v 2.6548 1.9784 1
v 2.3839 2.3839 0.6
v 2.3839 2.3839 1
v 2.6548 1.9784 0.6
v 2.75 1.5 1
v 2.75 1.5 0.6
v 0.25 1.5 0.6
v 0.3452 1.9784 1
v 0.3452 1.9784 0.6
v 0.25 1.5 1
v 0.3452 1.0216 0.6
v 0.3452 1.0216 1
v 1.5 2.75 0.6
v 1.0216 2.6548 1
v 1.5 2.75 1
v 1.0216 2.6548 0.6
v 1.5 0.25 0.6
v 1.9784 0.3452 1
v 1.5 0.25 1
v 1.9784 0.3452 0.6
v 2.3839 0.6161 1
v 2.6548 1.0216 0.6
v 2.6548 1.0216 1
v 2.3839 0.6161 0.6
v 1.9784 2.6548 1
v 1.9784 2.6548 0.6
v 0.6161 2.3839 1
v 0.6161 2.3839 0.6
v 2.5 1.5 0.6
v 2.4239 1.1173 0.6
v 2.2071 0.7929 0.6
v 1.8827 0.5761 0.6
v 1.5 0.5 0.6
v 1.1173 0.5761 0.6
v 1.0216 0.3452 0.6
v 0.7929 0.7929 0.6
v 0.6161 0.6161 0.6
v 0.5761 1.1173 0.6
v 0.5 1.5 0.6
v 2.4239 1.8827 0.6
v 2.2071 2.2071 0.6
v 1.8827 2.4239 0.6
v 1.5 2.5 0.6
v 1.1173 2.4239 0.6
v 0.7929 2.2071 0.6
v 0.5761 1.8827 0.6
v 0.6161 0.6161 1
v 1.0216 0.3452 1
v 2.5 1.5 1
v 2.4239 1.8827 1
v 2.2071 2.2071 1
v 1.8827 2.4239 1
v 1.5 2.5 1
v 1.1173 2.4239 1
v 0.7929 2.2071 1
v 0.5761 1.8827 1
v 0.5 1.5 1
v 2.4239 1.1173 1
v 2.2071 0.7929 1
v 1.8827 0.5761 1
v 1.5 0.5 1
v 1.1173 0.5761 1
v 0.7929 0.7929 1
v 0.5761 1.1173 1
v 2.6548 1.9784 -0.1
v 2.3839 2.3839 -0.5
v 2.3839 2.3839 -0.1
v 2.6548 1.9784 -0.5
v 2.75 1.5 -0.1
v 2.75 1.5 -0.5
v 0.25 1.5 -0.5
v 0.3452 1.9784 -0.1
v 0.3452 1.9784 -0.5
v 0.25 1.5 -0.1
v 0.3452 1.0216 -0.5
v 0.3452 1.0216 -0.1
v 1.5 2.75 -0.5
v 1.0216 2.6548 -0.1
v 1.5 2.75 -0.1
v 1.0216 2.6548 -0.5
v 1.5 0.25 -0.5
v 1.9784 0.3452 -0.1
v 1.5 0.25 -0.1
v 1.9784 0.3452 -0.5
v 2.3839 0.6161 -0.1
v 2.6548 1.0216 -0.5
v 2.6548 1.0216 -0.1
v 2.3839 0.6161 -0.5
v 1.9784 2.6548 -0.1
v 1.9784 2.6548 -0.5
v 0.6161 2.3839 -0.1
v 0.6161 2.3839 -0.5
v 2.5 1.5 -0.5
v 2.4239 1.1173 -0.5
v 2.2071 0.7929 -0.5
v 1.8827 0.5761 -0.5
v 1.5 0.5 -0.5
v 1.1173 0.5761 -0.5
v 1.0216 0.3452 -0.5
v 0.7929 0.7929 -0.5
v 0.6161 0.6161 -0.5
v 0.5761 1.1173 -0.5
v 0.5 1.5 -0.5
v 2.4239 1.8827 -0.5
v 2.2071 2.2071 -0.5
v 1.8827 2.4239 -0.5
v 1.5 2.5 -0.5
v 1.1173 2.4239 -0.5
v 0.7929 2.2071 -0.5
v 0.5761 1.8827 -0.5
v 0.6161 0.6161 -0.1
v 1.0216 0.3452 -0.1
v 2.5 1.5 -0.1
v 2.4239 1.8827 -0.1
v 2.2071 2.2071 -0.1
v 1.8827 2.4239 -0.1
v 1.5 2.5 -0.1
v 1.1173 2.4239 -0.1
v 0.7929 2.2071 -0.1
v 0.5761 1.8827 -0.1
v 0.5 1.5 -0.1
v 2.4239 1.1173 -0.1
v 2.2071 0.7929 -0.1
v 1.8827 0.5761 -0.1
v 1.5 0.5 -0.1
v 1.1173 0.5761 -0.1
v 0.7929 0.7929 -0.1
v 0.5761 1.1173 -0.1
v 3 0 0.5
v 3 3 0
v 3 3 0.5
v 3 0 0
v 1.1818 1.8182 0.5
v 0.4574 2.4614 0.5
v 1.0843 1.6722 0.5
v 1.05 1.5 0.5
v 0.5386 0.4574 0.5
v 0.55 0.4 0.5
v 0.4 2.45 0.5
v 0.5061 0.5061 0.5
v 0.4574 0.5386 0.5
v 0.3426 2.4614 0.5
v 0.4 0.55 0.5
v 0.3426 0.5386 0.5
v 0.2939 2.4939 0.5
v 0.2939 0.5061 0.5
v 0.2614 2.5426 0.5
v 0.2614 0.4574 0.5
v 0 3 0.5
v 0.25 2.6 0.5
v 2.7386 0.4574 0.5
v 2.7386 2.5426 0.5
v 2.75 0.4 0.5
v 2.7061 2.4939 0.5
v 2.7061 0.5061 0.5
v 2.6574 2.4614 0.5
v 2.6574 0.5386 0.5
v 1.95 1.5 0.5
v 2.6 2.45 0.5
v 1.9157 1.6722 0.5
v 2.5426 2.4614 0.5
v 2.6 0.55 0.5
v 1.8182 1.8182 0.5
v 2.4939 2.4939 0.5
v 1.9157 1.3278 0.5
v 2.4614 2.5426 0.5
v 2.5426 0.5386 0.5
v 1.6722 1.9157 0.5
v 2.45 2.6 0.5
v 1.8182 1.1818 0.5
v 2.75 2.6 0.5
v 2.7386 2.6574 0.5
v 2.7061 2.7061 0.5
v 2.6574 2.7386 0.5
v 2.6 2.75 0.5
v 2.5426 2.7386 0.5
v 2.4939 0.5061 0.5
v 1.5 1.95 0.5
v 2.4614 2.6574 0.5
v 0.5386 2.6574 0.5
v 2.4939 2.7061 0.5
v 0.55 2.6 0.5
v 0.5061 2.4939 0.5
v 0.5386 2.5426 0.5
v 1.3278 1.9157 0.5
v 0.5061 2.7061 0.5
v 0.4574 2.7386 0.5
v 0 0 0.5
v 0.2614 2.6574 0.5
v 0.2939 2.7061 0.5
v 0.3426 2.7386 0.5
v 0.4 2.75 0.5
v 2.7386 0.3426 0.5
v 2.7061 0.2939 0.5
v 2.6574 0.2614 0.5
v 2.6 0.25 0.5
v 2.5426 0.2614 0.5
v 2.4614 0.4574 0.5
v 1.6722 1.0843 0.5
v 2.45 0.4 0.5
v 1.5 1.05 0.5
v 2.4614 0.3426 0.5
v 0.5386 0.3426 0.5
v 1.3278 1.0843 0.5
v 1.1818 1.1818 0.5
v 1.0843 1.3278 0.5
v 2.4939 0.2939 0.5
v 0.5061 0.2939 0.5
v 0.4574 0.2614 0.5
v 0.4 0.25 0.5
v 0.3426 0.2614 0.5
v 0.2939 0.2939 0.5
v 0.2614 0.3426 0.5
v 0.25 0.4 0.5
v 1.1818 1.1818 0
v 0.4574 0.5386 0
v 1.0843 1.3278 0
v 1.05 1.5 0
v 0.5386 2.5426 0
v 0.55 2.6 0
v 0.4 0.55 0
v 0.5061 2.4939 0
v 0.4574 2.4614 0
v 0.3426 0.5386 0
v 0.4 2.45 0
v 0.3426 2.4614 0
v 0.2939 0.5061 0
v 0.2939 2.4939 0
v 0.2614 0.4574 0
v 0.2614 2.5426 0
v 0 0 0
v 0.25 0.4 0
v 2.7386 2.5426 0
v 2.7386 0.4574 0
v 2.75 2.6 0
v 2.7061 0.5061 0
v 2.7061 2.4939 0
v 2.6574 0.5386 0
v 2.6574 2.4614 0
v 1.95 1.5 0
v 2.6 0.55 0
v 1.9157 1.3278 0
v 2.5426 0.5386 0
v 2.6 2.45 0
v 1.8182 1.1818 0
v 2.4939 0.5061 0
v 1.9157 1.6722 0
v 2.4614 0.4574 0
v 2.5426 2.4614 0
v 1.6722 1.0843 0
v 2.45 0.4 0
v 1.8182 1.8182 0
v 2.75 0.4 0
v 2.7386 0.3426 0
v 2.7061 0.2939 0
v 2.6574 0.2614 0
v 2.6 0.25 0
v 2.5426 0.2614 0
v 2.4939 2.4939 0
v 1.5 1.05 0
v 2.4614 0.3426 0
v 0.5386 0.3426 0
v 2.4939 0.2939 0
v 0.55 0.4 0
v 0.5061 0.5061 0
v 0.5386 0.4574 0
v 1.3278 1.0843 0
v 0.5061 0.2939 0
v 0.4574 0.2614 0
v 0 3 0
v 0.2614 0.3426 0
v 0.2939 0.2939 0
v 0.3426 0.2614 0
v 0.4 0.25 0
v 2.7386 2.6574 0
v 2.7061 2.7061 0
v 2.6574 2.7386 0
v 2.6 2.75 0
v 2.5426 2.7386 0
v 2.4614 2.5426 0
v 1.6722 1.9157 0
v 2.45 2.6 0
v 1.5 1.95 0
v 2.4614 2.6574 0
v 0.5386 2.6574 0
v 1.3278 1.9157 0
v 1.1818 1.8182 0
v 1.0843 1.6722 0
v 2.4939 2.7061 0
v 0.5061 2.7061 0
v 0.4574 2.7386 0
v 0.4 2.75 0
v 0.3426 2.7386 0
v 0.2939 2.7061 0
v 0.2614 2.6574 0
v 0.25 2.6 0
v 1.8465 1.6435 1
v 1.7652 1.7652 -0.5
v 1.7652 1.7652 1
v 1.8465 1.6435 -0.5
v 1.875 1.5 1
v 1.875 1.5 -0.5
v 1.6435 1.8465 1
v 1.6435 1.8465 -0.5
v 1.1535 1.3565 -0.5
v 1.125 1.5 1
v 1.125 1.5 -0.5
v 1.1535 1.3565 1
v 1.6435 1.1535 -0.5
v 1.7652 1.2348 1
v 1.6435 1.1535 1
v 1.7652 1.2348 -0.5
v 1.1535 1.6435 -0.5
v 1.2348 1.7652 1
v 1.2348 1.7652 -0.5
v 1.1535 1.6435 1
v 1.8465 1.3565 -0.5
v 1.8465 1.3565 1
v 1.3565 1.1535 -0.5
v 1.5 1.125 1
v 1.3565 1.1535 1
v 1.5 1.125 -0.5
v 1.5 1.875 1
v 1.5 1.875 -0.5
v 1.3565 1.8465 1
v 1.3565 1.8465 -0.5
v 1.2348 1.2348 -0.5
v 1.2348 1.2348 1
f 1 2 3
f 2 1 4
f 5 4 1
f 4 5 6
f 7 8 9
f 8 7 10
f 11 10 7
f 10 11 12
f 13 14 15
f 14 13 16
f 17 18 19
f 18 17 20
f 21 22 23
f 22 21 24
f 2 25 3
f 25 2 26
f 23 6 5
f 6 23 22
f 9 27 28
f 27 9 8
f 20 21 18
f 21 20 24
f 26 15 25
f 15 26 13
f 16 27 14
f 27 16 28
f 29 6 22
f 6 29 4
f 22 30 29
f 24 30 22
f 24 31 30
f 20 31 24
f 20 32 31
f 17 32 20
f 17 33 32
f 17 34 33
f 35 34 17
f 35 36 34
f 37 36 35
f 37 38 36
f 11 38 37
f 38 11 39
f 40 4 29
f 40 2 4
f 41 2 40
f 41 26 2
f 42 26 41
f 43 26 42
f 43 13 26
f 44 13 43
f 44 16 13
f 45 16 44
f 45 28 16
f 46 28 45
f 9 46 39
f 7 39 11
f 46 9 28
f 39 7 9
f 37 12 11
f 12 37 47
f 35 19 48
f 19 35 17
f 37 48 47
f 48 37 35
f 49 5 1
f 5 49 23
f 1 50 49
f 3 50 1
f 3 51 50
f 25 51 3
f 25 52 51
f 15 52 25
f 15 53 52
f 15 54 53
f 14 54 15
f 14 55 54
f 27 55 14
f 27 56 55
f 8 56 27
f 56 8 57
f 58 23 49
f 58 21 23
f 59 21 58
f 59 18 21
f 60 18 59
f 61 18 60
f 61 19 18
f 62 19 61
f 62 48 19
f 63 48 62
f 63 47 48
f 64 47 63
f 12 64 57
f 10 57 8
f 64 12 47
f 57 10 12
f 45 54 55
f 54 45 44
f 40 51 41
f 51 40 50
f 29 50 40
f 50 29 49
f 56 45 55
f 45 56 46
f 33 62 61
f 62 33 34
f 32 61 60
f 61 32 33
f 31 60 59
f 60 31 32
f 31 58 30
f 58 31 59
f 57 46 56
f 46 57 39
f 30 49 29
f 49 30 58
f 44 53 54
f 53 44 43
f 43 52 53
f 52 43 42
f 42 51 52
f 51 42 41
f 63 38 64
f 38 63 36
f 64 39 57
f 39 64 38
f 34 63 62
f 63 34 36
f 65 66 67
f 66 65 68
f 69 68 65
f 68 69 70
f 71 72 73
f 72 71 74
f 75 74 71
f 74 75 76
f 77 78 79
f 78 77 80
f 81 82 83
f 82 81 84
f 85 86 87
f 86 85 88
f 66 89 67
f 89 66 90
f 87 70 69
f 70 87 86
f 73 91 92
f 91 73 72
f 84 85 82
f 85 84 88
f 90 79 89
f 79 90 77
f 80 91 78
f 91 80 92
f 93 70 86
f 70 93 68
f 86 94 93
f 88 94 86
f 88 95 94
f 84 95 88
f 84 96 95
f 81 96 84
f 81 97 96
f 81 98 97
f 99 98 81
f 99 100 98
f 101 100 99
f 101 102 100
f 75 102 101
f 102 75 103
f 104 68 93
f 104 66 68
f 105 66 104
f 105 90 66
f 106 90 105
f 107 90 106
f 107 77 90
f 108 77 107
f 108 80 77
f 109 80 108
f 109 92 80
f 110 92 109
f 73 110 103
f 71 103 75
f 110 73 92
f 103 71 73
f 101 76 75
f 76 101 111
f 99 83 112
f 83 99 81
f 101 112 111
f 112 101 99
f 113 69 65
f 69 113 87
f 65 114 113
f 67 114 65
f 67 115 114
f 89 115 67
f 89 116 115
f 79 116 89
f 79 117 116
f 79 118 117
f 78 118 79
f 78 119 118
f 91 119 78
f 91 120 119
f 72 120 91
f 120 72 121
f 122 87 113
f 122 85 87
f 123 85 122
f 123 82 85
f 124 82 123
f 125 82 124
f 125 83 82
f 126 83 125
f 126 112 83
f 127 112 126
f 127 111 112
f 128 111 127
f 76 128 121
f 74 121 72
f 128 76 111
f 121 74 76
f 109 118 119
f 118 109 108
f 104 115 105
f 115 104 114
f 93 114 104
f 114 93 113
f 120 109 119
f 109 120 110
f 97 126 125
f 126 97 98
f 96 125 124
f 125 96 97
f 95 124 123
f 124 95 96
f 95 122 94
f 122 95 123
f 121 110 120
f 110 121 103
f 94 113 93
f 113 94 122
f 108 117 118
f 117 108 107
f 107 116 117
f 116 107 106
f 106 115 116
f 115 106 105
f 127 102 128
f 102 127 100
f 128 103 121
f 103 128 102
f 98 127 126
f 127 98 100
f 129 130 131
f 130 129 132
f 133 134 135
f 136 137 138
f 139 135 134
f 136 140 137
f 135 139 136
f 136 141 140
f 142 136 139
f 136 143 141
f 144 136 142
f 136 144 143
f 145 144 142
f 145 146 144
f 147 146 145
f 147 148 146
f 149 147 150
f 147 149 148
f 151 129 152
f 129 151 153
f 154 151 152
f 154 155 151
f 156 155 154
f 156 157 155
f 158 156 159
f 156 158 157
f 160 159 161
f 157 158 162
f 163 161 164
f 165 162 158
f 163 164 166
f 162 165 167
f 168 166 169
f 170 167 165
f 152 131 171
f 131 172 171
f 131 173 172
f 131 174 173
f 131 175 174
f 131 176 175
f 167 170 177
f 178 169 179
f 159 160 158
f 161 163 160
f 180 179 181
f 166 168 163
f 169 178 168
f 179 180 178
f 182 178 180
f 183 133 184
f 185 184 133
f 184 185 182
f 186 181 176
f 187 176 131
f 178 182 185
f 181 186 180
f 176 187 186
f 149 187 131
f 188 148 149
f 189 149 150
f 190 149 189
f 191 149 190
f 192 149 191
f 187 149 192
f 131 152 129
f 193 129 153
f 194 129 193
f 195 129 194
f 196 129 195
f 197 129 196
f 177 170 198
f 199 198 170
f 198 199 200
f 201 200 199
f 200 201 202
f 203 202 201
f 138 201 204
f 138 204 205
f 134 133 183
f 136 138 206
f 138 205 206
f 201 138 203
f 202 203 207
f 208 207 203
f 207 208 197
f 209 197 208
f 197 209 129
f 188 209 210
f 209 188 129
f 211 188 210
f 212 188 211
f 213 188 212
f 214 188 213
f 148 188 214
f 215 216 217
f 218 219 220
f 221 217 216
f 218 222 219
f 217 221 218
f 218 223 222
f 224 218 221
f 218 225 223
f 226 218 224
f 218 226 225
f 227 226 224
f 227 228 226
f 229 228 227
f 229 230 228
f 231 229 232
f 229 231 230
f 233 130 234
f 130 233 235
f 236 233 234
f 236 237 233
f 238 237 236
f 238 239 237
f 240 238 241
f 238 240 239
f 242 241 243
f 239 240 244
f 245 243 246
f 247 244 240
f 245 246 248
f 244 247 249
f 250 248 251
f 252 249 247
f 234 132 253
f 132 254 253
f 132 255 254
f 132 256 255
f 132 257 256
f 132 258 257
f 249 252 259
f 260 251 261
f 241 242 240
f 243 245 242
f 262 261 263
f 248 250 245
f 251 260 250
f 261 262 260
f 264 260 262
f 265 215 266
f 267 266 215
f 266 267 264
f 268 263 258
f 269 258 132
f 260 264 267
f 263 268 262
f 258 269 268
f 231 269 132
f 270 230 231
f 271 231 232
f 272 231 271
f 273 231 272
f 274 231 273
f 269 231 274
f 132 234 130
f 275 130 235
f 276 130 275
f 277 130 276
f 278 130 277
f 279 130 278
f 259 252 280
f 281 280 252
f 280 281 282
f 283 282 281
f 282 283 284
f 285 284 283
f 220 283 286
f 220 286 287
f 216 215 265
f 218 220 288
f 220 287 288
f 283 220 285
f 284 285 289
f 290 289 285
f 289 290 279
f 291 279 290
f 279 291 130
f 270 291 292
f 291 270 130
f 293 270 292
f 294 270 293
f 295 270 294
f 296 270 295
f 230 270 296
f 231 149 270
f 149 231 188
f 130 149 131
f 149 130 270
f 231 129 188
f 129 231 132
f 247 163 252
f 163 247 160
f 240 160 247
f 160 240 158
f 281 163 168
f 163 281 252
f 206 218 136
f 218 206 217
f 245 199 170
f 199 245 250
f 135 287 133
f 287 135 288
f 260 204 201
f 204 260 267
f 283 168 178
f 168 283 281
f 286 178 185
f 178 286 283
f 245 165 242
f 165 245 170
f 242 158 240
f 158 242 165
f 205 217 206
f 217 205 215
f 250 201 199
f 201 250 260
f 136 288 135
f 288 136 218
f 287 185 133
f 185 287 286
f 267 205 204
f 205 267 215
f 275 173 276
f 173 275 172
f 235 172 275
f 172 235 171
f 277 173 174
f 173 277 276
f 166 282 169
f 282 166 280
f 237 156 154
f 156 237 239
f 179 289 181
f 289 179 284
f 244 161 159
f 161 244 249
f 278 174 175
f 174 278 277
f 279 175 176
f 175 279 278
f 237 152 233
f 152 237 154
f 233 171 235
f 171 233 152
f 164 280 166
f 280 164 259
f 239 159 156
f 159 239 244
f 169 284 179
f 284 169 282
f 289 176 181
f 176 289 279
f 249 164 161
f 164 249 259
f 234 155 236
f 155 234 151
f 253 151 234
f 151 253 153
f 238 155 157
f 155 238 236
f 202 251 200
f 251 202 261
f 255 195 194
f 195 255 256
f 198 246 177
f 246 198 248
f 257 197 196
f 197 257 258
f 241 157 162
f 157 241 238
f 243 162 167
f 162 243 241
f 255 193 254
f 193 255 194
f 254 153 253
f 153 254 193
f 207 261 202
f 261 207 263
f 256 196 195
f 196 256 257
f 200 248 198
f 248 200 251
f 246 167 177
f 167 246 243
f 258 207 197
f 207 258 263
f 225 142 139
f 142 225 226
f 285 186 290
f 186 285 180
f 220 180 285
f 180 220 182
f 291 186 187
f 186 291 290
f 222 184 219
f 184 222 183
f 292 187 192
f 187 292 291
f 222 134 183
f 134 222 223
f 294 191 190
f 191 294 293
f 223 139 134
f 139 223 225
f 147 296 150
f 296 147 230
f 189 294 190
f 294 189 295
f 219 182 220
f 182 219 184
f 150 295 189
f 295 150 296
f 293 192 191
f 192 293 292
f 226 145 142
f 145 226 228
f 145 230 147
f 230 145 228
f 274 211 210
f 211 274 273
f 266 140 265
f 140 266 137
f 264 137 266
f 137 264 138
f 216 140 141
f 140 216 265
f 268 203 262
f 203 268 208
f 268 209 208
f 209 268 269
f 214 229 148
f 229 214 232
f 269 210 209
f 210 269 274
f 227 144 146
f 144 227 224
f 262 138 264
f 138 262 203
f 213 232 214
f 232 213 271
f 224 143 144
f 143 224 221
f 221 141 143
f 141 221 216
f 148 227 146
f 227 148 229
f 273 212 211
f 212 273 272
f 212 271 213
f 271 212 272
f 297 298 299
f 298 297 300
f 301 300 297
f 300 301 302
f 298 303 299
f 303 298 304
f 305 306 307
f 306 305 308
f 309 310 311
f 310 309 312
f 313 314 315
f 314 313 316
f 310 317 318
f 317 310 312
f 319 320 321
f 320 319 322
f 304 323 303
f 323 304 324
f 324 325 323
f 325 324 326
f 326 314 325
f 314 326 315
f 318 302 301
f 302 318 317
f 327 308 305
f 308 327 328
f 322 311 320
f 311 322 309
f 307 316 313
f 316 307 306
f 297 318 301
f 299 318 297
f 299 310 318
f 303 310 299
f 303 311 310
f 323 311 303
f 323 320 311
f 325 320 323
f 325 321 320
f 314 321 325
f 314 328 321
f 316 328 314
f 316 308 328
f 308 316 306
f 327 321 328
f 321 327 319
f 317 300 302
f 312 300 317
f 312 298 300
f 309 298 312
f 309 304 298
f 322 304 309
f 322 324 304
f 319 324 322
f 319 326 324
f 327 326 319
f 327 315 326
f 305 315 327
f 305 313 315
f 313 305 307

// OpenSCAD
$fn = 16;

translate([1.5, 1.5, -0.5])
    cylinder(h = 1.5, d = 0.75);

module collimatore() {
    difference() {
        cylinder(h = 0.4, d = 2.5);
        translate([0, 0, -0.1])
            cylinder(h = 0.6, d = 2);
    }
}

translate([1.5, 1.5, 0.6])
    collimatore();
translate([1.5, 1.5, -0.5])
    collimatore();

difference() {
    cube([3, 3, 0.5]);
    translate([1.5, 1.5, -0.5])
        cylinder(h = 3, d = 0.9);
    translate([2.6, 2.6, -0.5])
        cylinder(h = 3, d = 0.3);
    translate([2.6, 0.4, -0.5])
        cylinder(h = 3, d = 0.3);
    translate([0.4, 2.6, -0.5])
        cylinder(h = 3, d = 0.3);
    translate([0.4, 0.4, -0.5])
        cylinder(h = 3, d = 0.3);
}
